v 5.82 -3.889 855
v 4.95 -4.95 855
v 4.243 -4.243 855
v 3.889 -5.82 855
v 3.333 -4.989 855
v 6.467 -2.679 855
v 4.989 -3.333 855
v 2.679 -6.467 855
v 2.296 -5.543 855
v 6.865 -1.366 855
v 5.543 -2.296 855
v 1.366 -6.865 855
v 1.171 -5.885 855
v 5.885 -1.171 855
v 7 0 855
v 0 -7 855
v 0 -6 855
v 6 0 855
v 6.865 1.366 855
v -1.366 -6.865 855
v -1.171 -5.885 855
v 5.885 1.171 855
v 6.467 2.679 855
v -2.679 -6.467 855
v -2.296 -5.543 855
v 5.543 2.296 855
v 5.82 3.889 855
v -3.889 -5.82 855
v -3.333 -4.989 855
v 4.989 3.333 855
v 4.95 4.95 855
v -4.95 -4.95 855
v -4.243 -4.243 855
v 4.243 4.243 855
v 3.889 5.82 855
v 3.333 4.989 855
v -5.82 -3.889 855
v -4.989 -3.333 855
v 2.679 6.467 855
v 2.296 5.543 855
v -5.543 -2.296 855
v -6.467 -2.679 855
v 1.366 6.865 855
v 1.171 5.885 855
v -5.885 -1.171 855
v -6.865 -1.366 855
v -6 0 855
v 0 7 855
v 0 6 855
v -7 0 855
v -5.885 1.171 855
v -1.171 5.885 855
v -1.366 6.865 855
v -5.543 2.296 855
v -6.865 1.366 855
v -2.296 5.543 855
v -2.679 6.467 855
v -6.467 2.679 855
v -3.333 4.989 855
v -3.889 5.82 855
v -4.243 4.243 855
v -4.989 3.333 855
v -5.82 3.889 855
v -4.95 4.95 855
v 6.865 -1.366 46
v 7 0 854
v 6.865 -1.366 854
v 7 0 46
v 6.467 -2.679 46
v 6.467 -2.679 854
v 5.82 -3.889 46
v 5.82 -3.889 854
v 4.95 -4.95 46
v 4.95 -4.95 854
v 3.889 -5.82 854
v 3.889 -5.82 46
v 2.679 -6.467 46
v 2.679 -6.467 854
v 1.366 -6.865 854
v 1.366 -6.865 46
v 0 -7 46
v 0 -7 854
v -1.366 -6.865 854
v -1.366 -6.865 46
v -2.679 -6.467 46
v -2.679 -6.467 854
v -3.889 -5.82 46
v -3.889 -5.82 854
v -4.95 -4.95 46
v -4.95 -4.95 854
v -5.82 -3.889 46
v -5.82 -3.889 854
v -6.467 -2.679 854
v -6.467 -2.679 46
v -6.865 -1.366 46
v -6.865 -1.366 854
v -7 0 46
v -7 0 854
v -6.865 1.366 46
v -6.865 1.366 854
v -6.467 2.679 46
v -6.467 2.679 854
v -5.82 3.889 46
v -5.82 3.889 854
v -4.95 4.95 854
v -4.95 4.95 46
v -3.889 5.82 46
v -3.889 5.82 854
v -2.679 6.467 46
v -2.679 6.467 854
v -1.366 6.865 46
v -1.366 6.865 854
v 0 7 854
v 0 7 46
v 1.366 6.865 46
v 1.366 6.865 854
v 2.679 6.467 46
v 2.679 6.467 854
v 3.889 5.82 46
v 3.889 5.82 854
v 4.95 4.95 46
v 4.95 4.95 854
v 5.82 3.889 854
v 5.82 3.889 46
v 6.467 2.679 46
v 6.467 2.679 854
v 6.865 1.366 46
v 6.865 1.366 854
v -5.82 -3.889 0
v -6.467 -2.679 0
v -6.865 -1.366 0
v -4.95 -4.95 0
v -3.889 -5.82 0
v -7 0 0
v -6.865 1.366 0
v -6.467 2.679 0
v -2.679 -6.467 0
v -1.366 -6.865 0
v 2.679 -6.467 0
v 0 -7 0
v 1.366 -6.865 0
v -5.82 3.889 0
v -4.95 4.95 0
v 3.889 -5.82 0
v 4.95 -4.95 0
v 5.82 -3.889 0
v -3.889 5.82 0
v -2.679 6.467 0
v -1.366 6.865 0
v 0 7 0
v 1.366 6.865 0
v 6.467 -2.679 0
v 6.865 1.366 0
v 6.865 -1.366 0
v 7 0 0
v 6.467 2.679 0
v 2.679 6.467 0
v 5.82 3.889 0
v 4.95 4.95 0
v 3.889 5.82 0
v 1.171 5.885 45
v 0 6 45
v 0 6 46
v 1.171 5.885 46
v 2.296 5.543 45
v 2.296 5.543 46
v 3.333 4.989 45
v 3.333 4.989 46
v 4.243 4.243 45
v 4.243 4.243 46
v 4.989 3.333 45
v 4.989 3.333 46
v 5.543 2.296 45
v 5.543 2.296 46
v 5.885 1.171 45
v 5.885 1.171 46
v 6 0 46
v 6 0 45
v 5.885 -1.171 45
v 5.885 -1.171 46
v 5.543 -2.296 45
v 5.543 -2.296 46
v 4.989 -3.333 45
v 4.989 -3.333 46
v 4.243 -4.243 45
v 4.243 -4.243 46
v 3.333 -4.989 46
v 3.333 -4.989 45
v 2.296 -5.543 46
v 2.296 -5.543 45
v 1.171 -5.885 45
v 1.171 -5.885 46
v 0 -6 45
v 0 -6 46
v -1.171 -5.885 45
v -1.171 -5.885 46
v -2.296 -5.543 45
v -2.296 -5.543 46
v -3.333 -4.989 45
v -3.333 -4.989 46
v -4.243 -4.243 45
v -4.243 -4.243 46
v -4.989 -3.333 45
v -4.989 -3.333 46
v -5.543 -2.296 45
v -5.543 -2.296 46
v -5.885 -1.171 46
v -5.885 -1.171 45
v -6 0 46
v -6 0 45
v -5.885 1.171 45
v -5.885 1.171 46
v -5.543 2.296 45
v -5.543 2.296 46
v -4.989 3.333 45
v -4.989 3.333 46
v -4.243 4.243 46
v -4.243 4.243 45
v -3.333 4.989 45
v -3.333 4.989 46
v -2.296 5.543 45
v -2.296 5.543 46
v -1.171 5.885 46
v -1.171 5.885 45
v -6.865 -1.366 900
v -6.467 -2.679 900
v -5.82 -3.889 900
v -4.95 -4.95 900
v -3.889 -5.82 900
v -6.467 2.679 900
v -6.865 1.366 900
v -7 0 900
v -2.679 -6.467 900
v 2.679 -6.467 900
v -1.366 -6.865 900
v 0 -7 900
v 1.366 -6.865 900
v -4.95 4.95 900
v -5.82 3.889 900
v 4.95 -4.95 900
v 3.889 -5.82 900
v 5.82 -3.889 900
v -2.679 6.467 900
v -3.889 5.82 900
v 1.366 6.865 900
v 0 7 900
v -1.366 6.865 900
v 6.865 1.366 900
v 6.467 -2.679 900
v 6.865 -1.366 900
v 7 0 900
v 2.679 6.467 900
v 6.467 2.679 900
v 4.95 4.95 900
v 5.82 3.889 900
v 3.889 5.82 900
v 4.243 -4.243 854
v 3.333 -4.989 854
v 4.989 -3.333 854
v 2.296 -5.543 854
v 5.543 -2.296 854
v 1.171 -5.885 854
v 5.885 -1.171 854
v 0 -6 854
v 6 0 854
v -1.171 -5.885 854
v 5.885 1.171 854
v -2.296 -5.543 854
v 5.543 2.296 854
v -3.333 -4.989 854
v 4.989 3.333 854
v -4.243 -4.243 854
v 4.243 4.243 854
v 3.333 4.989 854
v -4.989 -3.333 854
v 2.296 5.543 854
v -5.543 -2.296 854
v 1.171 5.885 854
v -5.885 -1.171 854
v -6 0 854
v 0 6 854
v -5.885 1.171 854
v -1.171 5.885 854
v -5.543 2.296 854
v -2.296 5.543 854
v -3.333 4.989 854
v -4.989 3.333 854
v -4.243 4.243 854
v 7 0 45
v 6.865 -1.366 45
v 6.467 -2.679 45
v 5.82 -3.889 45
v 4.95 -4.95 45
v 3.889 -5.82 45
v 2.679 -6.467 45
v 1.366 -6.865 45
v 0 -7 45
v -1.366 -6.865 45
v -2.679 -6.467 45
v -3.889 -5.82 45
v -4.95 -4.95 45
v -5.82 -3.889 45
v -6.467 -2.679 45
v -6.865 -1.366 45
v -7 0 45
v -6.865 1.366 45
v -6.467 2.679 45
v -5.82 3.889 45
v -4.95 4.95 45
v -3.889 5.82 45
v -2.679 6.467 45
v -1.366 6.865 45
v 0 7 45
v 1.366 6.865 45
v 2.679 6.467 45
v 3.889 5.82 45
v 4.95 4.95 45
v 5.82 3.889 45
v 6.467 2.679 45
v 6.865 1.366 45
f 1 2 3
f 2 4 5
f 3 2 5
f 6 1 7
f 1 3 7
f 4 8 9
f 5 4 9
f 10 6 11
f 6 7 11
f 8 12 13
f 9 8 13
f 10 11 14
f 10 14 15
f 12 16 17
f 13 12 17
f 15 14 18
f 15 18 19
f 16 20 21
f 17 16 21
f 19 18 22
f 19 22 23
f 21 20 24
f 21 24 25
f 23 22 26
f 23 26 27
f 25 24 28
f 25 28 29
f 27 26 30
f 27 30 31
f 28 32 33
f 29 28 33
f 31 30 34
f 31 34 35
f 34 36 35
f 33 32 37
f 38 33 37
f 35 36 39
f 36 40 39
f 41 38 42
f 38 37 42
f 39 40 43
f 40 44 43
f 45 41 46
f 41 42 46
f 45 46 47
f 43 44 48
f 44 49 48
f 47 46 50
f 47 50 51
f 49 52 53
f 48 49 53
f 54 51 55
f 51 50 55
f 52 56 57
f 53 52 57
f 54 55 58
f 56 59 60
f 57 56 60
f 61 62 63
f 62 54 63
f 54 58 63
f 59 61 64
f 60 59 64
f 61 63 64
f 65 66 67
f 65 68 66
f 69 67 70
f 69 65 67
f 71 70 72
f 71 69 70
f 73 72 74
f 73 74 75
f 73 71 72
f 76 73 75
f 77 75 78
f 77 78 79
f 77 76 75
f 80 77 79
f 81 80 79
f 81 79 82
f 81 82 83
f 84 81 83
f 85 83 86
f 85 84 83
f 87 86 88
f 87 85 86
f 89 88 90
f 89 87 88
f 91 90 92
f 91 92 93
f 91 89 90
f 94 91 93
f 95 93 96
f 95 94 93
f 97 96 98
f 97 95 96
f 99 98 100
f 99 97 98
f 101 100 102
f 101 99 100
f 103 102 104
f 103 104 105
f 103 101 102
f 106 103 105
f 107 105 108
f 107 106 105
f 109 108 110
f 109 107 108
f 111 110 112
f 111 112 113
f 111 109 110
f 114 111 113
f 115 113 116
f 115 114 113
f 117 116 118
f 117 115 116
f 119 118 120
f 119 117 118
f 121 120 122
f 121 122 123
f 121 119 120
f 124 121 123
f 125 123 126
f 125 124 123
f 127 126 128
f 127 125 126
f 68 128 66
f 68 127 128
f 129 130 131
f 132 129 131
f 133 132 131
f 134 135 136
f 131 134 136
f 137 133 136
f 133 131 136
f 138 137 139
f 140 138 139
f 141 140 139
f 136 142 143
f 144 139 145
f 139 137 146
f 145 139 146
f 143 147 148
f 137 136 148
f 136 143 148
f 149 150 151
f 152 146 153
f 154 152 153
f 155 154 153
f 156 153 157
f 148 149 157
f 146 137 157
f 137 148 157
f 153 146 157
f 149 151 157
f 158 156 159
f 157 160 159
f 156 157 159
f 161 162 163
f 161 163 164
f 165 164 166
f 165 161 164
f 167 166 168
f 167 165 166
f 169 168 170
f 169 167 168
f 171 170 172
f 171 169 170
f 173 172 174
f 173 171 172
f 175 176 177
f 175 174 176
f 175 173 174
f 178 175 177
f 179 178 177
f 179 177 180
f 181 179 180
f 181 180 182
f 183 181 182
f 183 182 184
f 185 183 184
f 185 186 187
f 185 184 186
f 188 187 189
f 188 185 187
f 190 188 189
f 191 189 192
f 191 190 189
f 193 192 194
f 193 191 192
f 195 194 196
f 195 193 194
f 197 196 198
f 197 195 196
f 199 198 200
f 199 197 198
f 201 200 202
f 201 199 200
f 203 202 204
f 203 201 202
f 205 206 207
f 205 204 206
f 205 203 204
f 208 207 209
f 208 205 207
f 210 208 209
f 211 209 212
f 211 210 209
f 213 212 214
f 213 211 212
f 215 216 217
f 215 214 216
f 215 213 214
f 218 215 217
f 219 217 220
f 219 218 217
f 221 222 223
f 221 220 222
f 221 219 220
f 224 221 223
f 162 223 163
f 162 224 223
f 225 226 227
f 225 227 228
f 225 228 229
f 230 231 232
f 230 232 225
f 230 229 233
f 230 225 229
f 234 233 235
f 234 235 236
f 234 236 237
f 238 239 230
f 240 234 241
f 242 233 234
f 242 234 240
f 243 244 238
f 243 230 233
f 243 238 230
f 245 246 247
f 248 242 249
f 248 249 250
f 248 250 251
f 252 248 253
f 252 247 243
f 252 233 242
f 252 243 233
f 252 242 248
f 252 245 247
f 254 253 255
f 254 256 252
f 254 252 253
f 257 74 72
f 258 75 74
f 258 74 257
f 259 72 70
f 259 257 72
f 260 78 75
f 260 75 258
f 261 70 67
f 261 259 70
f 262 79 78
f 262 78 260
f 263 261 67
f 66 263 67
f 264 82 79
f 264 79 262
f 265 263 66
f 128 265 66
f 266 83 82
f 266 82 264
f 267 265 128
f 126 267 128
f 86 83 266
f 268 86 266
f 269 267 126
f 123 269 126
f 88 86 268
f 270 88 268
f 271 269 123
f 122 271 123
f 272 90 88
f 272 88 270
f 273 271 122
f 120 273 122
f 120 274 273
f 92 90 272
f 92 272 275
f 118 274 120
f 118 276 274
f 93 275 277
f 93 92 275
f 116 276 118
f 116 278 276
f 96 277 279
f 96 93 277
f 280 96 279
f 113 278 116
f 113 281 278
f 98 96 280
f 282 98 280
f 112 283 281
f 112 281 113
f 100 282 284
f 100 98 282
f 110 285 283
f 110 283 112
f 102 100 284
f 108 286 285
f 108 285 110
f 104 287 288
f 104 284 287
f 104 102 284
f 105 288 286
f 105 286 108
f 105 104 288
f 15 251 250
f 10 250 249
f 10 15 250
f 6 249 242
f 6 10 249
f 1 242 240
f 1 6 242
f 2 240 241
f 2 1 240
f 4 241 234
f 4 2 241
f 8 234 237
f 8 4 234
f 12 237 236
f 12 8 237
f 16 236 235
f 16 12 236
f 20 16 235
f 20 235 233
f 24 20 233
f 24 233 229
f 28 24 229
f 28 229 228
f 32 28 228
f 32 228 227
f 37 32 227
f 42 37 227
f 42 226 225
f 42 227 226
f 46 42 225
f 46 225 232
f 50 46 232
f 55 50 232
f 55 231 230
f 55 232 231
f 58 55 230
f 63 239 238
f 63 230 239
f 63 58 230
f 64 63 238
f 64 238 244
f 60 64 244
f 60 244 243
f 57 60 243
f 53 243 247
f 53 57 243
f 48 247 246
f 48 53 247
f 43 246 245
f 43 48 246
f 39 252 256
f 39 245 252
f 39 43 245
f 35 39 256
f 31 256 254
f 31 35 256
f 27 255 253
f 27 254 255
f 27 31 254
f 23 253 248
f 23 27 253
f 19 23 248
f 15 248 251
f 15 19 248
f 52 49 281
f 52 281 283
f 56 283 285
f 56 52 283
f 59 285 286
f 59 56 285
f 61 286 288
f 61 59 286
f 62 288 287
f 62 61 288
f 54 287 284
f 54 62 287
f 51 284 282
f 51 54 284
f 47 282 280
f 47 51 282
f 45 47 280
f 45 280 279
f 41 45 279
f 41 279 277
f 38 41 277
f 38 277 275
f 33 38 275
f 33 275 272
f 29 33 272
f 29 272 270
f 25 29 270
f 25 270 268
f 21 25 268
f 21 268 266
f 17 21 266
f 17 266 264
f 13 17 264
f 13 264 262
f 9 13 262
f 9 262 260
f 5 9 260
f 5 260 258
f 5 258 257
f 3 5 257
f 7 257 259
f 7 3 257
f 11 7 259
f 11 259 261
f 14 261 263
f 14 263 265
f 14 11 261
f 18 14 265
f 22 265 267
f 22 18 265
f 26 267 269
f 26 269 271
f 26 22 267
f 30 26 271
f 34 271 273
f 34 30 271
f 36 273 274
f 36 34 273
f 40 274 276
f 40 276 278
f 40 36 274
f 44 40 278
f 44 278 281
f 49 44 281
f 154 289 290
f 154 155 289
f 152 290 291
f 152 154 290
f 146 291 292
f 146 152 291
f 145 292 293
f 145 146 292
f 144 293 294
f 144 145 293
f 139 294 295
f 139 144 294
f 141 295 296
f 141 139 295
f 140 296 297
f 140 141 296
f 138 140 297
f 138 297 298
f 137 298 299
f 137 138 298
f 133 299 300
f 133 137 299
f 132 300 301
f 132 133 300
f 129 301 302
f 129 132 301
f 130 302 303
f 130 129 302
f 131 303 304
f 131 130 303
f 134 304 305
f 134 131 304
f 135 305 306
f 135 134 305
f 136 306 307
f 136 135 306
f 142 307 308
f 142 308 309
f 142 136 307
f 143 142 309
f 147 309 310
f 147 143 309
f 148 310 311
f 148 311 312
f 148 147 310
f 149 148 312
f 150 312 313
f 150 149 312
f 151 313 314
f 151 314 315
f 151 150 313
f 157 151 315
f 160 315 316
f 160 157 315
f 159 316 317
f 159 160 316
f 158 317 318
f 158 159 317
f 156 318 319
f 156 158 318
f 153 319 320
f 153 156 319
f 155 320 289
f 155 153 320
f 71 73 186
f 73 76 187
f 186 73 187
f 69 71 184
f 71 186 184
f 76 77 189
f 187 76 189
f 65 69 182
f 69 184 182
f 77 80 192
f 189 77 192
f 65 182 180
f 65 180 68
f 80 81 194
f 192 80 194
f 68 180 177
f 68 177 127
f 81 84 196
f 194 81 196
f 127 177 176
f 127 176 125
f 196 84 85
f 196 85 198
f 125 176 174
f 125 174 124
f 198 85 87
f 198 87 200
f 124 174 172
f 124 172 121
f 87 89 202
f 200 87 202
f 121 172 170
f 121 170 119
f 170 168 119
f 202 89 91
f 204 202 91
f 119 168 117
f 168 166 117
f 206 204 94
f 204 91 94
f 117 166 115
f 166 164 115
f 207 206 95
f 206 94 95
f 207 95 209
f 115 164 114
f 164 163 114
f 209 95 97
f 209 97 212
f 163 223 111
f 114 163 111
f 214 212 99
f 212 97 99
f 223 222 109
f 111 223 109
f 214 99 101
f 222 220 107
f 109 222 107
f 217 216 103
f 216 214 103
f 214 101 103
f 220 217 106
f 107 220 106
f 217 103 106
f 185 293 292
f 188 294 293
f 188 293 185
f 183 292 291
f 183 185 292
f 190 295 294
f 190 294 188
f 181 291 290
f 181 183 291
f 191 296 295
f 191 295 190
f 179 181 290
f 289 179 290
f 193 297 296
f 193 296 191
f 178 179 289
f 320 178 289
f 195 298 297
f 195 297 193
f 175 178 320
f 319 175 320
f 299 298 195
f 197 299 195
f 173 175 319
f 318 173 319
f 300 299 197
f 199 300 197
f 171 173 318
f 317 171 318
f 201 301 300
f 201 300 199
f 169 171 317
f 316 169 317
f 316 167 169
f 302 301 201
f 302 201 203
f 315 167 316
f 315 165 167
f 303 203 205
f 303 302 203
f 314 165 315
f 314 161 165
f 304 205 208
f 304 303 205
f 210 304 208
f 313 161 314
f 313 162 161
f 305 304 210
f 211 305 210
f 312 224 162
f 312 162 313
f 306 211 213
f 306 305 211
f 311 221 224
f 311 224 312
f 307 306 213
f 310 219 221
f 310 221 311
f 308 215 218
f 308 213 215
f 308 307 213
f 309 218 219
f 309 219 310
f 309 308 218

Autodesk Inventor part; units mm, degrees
ref_plane "YZ Plane" through (0, 0, 0) normal (1, 0, 0) x (0, 1, 0)
ref_plane "XZ Plane" through (0, 0, 0) normal (0, 1, 0) x (-1, 0, 0)
ref_plane "XY Plane" through (0, 0, 0) normal (0, 0, 1) x (1, 0, 0)
sketch "Эскиз1" plane through (0, 0, 0) normal (0, 0, 1) x (1, 0, 0)
  circle A0 centre (0, 0) radius 7
  dimension "d0" = 14
extrude "Выдавливание1" add sketch "Эскиз1" along normal blind 900
sketch "Эскиз2" plane through (0, 0, 0) normal (1, 0, 0) x (0, 1, 0)
  line L0 (7, 900) -> (-7, 900) projected
  line L1 (7, 0) -> (-7, 0) projected
  line L2 (0, 0) -> (0, 45)
  line L3 (0, 45) -> (7, 45)
  line L4 (7, 0) -> (7, 900) projected
  line L5 (7, 45) -> (7, 46)
  line L6 (7, 46) -> (0, 46)
  line L7 (0, 46) -> (0, 45)
  line L8 (0, 900) -> (0, 855)
  line L9 (0, 855) -> (7, 855)
  line L10 (7, 855) -> (7, 854)
  line L11 (0, -180) -> (0, 1080) projected
  line L12 (7, 854) -> (0, 854)
  line L13 (0, 855) -> (0, 854)
  line L14 (0, 46) -> (0, 45)
  line L15 (7, 46) -> (6, 46)
  line L16 (6, 46) -> (6, 45)
  line L17 (7, 855) -> (6, 855)
  line L18 (6, 854) -> (6, 855)
  dimension "d3" = 45
  dimension "d4" = 45
  dimension "d5" = 1
revolve "Вращение1" cut sketch "Эскиз2" angle 360 about axis through (0, 0, -10) along (0, 0, 1) contours L4 L12 L18 L9 | L4 L3 L16 L6
thread "Резьба1" size "M14x2" class "6g" standard "ANSI Metric M Profile" full length
thread "Резьба2" size "M14x2" class "6g" standard "ANSI Metric M Profile" full length
properties part number "Стяжка" material "Сталь, высокопрочная, низколегированная"
